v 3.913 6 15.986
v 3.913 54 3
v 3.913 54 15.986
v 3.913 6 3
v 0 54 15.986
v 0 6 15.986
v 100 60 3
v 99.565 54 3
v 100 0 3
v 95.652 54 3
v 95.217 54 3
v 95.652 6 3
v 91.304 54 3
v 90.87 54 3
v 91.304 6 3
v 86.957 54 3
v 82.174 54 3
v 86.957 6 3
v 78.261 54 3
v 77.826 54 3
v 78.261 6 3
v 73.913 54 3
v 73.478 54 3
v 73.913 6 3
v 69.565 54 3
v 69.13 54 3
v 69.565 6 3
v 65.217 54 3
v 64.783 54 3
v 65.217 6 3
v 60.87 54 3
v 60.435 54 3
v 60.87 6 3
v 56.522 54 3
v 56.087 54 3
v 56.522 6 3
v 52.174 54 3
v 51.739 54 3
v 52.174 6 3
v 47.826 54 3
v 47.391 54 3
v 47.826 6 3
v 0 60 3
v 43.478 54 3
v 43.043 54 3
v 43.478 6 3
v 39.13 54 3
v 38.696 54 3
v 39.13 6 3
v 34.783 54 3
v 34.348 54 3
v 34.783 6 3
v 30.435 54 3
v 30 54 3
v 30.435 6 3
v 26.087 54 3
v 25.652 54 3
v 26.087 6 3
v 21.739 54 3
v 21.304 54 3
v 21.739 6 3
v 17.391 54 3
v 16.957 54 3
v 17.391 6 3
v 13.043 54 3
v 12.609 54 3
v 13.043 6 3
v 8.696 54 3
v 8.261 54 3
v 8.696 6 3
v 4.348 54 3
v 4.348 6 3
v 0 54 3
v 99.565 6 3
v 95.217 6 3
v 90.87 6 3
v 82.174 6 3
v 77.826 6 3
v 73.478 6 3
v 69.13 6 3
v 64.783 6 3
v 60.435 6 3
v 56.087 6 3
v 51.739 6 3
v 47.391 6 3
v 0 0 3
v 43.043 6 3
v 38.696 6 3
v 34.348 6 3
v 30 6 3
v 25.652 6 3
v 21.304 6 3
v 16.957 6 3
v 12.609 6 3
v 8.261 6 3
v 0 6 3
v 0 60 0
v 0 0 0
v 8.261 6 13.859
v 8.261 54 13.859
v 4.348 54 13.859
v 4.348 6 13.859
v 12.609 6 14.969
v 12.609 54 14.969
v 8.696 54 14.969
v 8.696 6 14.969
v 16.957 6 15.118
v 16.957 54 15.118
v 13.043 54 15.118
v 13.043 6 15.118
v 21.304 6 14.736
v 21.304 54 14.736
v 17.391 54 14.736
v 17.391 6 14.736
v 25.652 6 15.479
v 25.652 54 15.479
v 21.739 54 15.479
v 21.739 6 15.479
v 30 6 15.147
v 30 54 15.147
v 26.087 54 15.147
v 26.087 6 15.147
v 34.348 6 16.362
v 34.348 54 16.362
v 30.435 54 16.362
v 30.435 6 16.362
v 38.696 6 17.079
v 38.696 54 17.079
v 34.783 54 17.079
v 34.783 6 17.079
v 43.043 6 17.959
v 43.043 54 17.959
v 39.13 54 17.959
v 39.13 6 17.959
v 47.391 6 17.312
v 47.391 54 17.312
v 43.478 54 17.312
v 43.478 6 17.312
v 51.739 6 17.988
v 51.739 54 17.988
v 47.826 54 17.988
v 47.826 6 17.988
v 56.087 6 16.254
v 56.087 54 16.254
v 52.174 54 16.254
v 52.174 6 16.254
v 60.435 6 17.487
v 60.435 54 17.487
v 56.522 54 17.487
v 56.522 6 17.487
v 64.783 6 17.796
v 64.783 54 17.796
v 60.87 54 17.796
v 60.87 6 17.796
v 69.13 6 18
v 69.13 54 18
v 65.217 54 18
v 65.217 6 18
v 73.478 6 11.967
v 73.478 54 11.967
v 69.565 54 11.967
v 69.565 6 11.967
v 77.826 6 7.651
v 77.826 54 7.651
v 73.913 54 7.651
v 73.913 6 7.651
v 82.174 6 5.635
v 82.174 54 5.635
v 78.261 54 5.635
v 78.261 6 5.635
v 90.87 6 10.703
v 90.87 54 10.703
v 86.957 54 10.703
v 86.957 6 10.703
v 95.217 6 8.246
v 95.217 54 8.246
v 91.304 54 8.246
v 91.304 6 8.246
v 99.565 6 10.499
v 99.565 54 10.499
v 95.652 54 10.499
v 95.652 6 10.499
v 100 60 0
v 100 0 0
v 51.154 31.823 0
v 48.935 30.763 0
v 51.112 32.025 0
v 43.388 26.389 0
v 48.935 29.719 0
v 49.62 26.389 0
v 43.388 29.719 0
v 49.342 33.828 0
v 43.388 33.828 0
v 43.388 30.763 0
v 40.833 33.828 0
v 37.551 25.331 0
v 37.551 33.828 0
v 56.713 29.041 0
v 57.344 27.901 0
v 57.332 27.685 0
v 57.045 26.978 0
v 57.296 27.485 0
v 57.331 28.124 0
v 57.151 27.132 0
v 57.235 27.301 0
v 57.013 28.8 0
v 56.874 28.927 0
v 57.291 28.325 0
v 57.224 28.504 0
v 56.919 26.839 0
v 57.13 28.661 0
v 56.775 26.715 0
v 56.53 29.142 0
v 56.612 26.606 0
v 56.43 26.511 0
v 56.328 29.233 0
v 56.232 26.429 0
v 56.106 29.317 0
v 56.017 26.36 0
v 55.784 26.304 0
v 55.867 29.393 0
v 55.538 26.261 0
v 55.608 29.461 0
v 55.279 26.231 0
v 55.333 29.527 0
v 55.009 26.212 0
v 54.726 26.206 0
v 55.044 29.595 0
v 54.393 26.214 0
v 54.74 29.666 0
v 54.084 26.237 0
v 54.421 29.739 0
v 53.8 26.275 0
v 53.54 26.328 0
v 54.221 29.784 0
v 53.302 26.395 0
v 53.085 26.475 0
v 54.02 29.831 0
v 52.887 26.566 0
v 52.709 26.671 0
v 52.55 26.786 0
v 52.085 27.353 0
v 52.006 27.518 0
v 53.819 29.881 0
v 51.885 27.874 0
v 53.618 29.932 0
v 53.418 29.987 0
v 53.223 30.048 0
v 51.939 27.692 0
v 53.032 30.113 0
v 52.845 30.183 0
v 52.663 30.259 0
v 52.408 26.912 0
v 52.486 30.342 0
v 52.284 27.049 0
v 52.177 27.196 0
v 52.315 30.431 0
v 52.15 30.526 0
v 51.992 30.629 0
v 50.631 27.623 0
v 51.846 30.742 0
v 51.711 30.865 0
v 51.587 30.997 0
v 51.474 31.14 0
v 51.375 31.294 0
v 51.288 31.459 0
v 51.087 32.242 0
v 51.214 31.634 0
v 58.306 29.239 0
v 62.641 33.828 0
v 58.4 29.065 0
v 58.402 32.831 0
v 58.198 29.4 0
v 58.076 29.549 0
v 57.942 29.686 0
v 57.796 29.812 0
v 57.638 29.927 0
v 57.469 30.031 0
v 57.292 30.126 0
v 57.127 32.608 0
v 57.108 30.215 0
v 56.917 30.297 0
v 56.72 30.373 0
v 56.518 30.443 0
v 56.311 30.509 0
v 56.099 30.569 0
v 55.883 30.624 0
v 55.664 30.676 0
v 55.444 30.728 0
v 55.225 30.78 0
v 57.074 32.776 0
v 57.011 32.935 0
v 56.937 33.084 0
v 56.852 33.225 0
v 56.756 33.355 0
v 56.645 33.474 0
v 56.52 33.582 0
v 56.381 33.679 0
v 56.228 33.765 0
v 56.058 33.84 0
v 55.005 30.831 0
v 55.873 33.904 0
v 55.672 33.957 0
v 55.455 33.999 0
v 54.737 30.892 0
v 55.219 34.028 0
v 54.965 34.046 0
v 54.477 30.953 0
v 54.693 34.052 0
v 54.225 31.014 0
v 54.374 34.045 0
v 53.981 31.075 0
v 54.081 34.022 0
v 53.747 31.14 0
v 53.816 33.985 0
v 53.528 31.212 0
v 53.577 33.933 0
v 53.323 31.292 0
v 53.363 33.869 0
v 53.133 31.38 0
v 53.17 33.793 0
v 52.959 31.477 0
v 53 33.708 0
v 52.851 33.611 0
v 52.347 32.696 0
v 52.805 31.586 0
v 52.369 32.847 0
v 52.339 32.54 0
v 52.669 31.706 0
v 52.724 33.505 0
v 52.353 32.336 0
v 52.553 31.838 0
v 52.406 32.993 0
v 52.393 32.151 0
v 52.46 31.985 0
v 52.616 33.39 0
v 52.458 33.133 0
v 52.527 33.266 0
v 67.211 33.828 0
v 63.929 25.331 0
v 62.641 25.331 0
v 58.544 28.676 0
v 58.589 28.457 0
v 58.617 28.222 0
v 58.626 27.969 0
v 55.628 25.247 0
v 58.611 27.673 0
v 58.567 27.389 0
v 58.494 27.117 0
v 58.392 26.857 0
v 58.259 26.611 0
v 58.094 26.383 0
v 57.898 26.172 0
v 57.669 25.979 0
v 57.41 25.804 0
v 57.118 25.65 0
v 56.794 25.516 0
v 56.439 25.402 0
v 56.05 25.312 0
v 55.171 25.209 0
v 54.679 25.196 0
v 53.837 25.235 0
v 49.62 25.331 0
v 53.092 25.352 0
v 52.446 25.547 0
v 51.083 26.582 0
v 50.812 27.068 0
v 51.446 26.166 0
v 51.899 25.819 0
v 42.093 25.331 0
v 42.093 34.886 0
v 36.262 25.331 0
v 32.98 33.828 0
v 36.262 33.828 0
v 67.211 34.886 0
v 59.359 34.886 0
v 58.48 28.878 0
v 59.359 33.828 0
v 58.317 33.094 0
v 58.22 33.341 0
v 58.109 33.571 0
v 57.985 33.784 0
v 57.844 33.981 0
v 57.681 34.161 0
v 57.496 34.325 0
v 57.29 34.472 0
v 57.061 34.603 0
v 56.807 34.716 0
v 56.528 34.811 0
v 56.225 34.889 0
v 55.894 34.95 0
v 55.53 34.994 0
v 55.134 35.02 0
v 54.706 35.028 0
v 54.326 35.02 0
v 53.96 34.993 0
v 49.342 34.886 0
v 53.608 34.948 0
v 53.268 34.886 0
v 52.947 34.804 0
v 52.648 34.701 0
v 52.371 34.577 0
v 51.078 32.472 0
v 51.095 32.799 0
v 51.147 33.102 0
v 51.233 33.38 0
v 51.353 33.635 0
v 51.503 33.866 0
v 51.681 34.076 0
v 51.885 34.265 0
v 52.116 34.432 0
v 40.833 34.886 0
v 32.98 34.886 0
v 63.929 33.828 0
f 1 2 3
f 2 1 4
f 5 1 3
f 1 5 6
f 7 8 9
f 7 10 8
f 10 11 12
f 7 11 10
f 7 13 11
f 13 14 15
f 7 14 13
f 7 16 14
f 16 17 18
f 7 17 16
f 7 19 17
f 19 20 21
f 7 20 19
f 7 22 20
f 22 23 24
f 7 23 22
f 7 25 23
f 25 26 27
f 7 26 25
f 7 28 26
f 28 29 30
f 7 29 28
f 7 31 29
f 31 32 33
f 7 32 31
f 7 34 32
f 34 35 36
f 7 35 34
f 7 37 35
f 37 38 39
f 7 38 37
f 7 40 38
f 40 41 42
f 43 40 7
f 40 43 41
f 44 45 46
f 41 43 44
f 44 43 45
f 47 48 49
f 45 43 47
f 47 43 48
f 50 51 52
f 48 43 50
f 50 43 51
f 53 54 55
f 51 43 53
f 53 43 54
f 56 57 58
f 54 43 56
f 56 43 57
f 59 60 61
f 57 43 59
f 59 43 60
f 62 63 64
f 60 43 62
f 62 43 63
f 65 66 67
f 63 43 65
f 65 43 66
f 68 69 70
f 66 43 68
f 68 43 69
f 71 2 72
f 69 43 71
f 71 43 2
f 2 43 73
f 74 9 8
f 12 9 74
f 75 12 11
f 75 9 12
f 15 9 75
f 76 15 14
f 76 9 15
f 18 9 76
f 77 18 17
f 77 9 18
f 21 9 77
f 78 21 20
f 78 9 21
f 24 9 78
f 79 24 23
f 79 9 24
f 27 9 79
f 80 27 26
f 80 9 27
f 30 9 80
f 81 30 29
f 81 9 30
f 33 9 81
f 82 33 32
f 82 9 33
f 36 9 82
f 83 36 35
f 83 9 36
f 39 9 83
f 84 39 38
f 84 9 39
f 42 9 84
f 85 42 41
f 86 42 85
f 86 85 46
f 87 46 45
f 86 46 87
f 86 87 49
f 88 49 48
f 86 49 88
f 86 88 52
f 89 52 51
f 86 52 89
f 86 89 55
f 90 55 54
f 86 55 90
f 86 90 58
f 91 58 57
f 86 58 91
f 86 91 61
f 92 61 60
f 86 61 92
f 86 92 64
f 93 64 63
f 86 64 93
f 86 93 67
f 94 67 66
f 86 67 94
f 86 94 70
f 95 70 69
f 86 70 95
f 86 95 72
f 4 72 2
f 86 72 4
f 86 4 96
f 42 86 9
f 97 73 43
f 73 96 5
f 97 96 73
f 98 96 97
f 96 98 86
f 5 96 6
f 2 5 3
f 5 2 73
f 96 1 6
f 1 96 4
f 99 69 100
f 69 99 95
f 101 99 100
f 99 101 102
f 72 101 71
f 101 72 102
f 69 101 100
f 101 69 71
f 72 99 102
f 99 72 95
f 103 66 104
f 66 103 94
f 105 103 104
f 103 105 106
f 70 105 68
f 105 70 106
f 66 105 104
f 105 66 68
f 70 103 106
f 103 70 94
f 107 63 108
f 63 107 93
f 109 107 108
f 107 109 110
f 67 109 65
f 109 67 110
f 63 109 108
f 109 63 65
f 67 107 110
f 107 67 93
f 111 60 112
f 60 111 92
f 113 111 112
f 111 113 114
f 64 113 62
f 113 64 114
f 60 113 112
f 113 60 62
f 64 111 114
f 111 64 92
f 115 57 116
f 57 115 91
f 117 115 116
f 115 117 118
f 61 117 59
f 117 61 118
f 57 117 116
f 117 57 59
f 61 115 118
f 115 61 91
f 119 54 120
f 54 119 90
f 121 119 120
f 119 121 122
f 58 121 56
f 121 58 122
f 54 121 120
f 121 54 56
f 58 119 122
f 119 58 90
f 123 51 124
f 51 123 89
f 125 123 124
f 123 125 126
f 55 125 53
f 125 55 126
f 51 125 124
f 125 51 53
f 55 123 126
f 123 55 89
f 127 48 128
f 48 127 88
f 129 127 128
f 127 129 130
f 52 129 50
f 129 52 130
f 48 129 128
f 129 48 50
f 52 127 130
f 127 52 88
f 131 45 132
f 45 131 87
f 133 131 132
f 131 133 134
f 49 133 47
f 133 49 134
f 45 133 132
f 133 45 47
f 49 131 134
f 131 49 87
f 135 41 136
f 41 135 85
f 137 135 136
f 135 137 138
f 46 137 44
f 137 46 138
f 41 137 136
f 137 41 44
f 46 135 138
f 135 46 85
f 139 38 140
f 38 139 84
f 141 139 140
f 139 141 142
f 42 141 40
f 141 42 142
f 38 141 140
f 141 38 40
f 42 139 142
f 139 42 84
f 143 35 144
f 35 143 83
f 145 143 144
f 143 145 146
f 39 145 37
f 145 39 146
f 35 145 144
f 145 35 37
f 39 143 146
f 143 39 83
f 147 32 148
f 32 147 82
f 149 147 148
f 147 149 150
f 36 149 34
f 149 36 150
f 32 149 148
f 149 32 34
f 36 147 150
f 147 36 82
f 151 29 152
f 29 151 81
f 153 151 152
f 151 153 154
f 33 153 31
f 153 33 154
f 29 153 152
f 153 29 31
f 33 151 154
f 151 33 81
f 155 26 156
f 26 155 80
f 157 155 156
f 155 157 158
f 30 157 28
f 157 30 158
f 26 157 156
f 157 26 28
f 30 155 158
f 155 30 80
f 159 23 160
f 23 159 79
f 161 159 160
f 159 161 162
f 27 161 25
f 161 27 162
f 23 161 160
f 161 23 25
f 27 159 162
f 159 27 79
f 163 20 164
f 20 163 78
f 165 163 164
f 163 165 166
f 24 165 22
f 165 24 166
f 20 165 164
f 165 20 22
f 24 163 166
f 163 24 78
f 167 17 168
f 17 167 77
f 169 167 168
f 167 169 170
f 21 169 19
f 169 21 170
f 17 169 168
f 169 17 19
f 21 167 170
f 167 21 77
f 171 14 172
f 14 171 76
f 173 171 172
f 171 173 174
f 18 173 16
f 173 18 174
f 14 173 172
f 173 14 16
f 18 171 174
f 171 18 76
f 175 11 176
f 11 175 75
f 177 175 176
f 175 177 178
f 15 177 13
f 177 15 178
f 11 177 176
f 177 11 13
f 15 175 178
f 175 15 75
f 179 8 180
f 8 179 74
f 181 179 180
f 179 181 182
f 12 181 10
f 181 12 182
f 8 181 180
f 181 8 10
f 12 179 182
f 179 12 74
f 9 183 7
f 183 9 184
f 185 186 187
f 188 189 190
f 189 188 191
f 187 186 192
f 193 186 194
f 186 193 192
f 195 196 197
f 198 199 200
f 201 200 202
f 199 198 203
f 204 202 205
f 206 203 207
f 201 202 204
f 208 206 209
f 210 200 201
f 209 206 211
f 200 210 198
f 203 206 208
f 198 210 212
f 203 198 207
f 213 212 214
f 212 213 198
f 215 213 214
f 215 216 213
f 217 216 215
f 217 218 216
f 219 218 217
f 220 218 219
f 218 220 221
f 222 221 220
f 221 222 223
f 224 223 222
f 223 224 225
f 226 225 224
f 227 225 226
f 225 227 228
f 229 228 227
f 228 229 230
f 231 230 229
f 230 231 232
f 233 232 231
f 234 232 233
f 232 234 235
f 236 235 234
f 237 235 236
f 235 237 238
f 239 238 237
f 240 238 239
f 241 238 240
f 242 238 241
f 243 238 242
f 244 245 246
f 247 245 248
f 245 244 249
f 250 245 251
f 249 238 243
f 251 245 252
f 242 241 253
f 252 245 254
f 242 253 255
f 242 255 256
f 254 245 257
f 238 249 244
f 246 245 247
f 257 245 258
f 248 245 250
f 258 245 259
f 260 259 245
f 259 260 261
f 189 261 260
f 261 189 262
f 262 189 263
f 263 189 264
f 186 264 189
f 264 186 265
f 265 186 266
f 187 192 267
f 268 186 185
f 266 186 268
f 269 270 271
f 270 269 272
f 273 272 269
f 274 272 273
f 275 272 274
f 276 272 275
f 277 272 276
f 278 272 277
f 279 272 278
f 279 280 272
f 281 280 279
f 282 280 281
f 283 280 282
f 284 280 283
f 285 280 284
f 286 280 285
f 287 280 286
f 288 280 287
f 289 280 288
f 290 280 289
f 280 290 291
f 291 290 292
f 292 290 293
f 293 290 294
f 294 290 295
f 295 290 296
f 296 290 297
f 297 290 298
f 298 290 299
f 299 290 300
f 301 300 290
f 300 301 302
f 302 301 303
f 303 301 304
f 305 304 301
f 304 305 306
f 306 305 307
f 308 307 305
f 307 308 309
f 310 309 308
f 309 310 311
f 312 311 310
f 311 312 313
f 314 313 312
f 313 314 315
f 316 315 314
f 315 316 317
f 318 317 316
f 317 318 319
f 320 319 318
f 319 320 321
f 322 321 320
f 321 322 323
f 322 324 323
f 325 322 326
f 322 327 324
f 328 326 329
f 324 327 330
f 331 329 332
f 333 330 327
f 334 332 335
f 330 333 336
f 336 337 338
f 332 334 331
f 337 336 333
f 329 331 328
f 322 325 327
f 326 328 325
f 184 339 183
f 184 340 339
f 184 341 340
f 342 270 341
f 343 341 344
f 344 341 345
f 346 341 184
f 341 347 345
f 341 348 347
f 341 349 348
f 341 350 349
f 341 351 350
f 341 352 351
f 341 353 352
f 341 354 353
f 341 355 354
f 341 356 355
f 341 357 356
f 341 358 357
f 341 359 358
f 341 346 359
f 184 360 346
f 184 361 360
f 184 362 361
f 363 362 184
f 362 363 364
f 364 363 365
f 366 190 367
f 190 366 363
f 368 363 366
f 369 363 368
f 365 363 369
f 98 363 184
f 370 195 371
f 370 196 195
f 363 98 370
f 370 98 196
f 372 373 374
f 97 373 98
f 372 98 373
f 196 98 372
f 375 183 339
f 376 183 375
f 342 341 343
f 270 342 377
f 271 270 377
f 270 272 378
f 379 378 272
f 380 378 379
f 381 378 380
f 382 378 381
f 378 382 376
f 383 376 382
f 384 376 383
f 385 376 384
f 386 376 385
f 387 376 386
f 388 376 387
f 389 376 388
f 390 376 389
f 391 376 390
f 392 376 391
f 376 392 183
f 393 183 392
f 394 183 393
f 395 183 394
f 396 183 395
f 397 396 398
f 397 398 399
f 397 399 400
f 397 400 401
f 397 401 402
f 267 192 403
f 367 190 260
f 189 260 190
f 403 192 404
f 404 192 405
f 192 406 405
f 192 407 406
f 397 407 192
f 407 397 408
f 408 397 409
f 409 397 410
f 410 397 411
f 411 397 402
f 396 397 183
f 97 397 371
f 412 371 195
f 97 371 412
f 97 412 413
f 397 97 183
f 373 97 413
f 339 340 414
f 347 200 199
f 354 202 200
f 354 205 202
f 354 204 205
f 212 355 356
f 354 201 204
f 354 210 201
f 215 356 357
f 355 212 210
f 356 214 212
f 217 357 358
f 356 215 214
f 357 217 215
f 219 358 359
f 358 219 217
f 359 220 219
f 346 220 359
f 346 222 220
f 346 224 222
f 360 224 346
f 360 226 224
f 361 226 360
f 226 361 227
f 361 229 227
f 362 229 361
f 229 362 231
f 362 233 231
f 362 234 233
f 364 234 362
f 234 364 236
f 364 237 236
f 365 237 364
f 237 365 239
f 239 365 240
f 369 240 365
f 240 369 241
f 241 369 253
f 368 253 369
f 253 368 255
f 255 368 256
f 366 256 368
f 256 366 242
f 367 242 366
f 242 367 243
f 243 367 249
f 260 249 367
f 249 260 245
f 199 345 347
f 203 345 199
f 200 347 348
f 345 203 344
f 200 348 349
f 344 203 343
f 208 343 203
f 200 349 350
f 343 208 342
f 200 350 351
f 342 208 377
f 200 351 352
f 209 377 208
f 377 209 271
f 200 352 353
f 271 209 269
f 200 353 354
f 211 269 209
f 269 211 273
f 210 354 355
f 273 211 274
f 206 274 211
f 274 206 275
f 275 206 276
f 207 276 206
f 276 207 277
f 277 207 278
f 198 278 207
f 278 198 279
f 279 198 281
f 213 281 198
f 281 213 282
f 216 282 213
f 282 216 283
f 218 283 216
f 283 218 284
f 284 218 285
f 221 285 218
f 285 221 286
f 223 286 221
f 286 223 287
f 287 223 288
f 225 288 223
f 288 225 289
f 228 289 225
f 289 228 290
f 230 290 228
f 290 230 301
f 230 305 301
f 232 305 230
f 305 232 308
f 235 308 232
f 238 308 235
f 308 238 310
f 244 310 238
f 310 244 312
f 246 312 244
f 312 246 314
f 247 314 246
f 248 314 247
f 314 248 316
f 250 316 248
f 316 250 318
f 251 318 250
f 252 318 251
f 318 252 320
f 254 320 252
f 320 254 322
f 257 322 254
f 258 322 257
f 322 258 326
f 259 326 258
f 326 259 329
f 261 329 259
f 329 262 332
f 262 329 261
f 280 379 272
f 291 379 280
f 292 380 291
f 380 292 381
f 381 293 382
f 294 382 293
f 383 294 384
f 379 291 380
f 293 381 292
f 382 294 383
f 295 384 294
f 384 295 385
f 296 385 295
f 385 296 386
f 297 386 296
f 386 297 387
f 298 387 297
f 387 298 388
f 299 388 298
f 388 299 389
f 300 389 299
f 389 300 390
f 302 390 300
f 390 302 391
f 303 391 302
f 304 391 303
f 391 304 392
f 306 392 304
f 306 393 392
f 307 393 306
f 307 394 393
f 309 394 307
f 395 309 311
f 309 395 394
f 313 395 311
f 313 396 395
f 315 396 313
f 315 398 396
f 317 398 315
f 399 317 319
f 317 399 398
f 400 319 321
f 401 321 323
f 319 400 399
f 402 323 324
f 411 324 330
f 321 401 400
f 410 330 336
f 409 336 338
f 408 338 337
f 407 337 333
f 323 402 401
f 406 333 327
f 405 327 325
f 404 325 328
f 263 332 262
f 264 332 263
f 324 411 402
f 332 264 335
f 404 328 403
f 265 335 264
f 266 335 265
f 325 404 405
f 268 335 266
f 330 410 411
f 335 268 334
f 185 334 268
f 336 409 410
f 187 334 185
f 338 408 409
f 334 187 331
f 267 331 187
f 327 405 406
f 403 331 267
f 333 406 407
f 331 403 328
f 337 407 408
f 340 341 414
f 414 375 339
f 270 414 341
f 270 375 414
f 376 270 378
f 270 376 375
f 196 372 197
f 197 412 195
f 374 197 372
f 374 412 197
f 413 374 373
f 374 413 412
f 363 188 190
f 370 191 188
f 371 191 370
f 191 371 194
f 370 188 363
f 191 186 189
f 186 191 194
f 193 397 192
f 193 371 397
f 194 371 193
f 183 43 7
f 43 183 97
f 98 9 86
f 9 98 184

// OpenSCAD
// Generated by SolidPython 1.1.3 on 2025-04-12 11:14:56


difference() {
	union() {
		cube(center = false, size = [100, 60, 3]);
		union() {
			translate(v = [0.0000000000, 6.0000000000, 3]) {
				cube(size = [3.9130434783, 48.0000000000, 12.986204537140186]);
			}
			translate(v = [4.3478260870, 6.0000000000, 3]) {
				cube(size = [3.9130434783, 48.0000000000, 10.858750813041151]);
			}
			translate(v = [8.6956521739, 6.0000000000, 3]) {
				cube(size = [3.9130434783, 48.0000000000, 11.969110069021792]);
			}
			translate(v = [13.0434782609, 6.0000000000, 3]) {
				cube(size = [3.9130434783, 48.0000000000, 12.117738734673768]);
			}
			translate(v = [17.3913043478, 6.0000000000, 3]) {
				cube(size = [3.9130434783, 48.0000000000, 11.73596366350858]);
			}
			translate(v = [21.7391304348, 6.0000000000, 3]) {
				cube(size = [3.9130434783, 48.0000000000, 12.479115885564132]);
			}
			translate(v = [26.0869565217, 6.0000000000, 3]) {
				cube(size = [3.9130434783, 48.0000000000, 12.146883702949589]);
			}
			translate(v = [30.4347826087, 6.0000000000, 3]) {
				cube(size = [3.9130434783, 48.0000000000, 13.36215417216846]);
			}
			translate(v = [34.7826086957, 6.0000000000, 3]) {
				cube(size = [3.9130434783, 48.0000000000, 14.079074144016632]);
			}
			translate(v = [39.1304347826, 6.0000000000, 3]) {
				cube(size = [3.9130434783, 48.0000000000, 14.959199712552525]);
			}
			translate(v = [43.4782608696, 6.0000000000, 3]) {
				cube(size = [3.9130434783, 48.0000000000, 14.312220549529846]);
			}
			translate(v = [47.8260869565, 6.0000000000, 3]) {
				cube(size = [3.9130434783, 48.0000000000, 14.988344680828348]);
			}
			translate(v = [52.1739130435, 6.0000000000, 3]) {
				cube(size = [3.9130434783, 48.0000000000, 13.254321347066153]);
			}
			translate(v = [56.5217391304, 6.0000000000, 3]) {
				cube(size = [3.9130434783, 48.0000000000, 14.4870814653892]);
			}
			translate(v = [60.8695652174, 6.0000000000, 3]) {
				cube(size = [3.9130434783, 48.0000000000, 14.795998562762627]);
			}
			translate(v = [65.2173913043, 6.0000000000, 3]) {
				cube(size = [3.9130434783, 48.0000000000, 15.0]);
			}
			translate(v = [69.5652173913, 6.0000000000, 3]) {
				cube(size = [3.9130434783, 48.0000000000, 8.967360659421583]);
			}
			translate(v = [73.9130434783, 6.0000000000, 3]) {
				cube(size = [3.9130434783, 48.0000000000, 4.65125500350119]);
			}
			translate(v = [78.2608695652, 6.0000000000, 3]) {
				cube(size = [3.9130434783, 48.0000000000, 2.634546822572928]);
			}
			translate(v = [82.6086956522, 6.0000000000, 3]) {
				cube(size = [3.9130434783, 48.0000000000, 0.0]);
			}
			translate(v = [86.9565217391, 6.0000000000, 3]) {
				cube(size = [3.9130434783, 48.0000000000, 7.702547301652045]);
			}
			translate(v = [91.3043478261, 6.0000000000, 3]) {
				cube(size = [3.9130434783, 48.0000000000, 5.245774113006939]);
			}
			translate(v = [95.6521739130, 6.0000000000, 3]) {
				cube(size = [3.9130434783, 48.0000000000, 7.498541417516872]);
			}
		}
	}
	translate(v = [50.0000000000, 30.0000000000, -2]) {
		linear_extrude(height = 2) {
			text(halign = "center", size = 10, text = "TEST", valign = "center");
		}
	}
}
/***********************************************
*********      SolidPython code:      **********
************************************************
 
#!/usr/bin/env python3
"""
Improved 3D Model Generation Module for Crazy Stock Badges Project

This module provides classes and functions for generating 3D models from stock data
using SolidPython to create OpenSCAD files that can be rendered to STL for 3D printing.
"""

import os
import numpy as np
import pandas as pd
from solid import *
from solid.utils import *
import logging
from abc import ABC, abstractmethod
from pathlib import Path
import math

# Configure logging
logging.basicConfig(
    level=logging.INFO,
    format='%(asctime)s - %(name)s - %(levelname)s - %(message)s'
)
logger = logging.getLogger('improved_3d_models')


class StockDataValidator:
    """Validates and preprocesses stock data for 3D model generation."""
    
    @staticmethod
    def validate_data(data):
        """
        Validate that the data contains the required columns.
        
        Args:
            data (pandas.DataFrame): Stock data
            
        Returns:
            bool: True if data is valid, False otherwise
        """
        required_columns = ['Close', 'Volume']
        
        if not isinstance(data, pd.DataFrame):
            logger.error("Data must be a pandas DataFrame")
            return False
        
        for col in required_columns:
            if col not in data.columns:
                logger.error(f"Required column '{col}' not found in data")
                return False
        
        if len(data) < 5:
            logger.error("Data must contain at least 5 rows")
            return False
            
        return True
    
    @staticmethod
    def normalize_data(data, columns=None, new_min=0, new_max=10):
        """
        Normalize specified columns to a new range.
        
        Args:
            data (pandas.DataFrame): Stock data
            columns (list): List of columns to normalize
            new_min (float): Minimum value for normalized data
            new_max (float): Maximum value for normalized data
            
        Returns:
            pandas.DataFrame: Data with normalized columns added
        """
        if columns is None:
            columns = ['Close', 'Volume']
        
        result = data.copy()
        
        for col in columns:
            if col in data.columns:
                norm_col = f'{col}_Normalized'
                min_val = data[col].min()
                max_val = data[col].max()
                
                # Avoid division by zero
                if max_val == min_val:
                    result[norm_col] = new_min
                else:
                    result[norm_col] = (data[col] - min_val) / (max_val - min_val) * (new_max - new_min) + new_min
            else:
                logger.warning(f"Column '{col}' not found in data, skipping normalization")
        
        return result


class Badge3DModel(ABC):
    """Abstract base class for 3D badge models."""
    
    def __init__(self, stock_data, ticker_symbol, params=None):
        """
        Initialize the 3D model.
        
        Args:
            stock_data (pandas.DataFrame): Stock data
            ticker_symbol (str): Stock ticker symbol
            params (dict): Additional parameters for the model
        """
        self.ticker_symbol = ticker_symbol
        self.params = params or {}
        
        # Validate and normalize data
        validator = StockDataValidator()
        if not validator.validate_data(stock_data):
            raise ValueError("Invalid stock data")
        
        # Set default normalization ranges
        height_range = self.params.get('height_range', (0, 15))
        width_range = self.params.get('width_range', (0, 10))
        
        # Normalize data
        self.data = validator.normalize_data(
            stock_data, 
            columns=['Close', 'Volume', 'High', 'Low'],
            new_min=height_range[0],
            new_max=height_range[1]
        )
        
        # Normalize volume separately for width
        self.data['Volume_Width'] = validator.normalize_data(
            stock_data, 
            columns=['Volume'],
            new_min=width_range[0],
            new_max=width_range[1]
        )['Volume_Normalized']
        
        # Initialize model components
        self.base_model = None
        self.feature_model = None
        self.text_model = None
        self.final_model = None
        
        # Model statistics
        self.stats = {
            'num_objects': 0,
            'height_diff': 0,
            'width_diff': 0,
            'depth_diff': 0,
            'size': (0, 0, 0)
        }
    
    @abstractmethod
    def generate_base(self):
        """Generate the base part of the model."""
        pass
    
    @abstractmethod
    def generate_feature(self):
        """Generate the feature part of the model based on stock data."""
        pass
    
    @abstractmethod
    def generate_text(self):
        """Generate text elements for the model."""
        pass
    
    def combine_models(self):
        """
        Combine base, feature, and text models into the final model.
        
        Returns:
            solid.OpenSCADObject: Combined 3D model
        """
        if self.base_model is None:
            self.generate_base()
        
        if self.feature_model is None:
            self.generate_feature()
        
        if self.text_model is None:
            self.generate_text()
        
        # Combine models
        combined = union()(
            self.base_model,
            self.feature_model
        )
        
        # Apply text as a difference (engraving)
        if self.text_model is not None:
            self.final_model = difference()(
                combined,
                self.text_model
            )
        else:
            self.final_model = combined
        
        return self.final_model
    
    def calculate_stats(self):
        """
        Calculate statistics about the model.
        
        Returns:
            dict: Model statistics
        """
        # This is a placeholder - in a real implementation, we would
        # analyze the OpenSCAD model to extract these statistics
        self.stats['num_objects'] = len(self.data)
        self.stats['height_diff'] = self.params.get('height_range', (0, 15))[1]
        self.stats['width_diff'] = self.params.get('width_range', (0, 10))[1]
        self.stats['depth_diff'] = 5  # Example value
        self.stats['size'] = (100, 100, 20)  # Example values
        
        return self.stats
    
    def save_to_file(self, filename=None):
        """
        Save the model to an OpenSCAD file.
        
        Args:
            filename (str): Output filename
            
        Returns:
            str: Path to the saved file
        """
        if self.final_model is None:
            self.combine_models()
        
        if filename is None:
            filename = f"{self.ticker_symbol}_badge.scad"
        
        # Save the model
        scad_render_to_file(self.final_model, filename)
        logger.info(f"Model saved to {filename}")
        
        return filename


class DiscBadge(Badge3DModel):
    """Circular badge with stock data features."""
    
    def generate_base(self):
        """
        Generate a circular base for the badge.
        
        Returns:
            solid.OpenSCADObject: Base 3D model
        """
        radius = self.params.get('base_radius', 50)
        height = self.params.get('base_height', 3)
        
        self.base_model = cylinder(r=radius, h=height, center=False)
        return self.base_model
    
    def generate_feature(self):
        """
        Generate features on the badge based on stock data.
        
        Returns:
            solid.OpenSCADObject: Feature 3D model
        """
        feature_type = self.params.get('feature_type', 'jagged_edge')
        
        if feature_type == 'jagged_edge':
            self.feature_model = self._generate_jagged_edge()
        elif feature_type == 'spiral':
            self.feature_model = self._generate_spiral()
        else:
            logger.warning(f"Unknown feature type: {feature_type}, using jagged_edge")
            self.feature_model = self._generate_jagged_edge()
        
        return self.feature_model
    
    def _generate_jagged_edge(self):
        """
        Generate a jagged edge disc based on stock prices.
        
        Returns:
            solid.OpenSCADObject: Jagged edge 3D model
        """
        base_radius = self.params.get('base_radius', 50)
        height = self.params.get('feature_height', 2)
        z_offset = self.params.get('base_height', 3)
        
        # Parameters for the polygon
        num_points = len(self.data)  # Use all data points
        angles = np.linspace(0, 2 * np.pi, num_points)  # Angles around the circle
        
        # Map normalized stock prices to the polygon edge
        radii = self.data['Close_Normalized'] + base_radius
        
        # Create points for the polygon
        points = []
        for i in range(num_points):
            x = radii.iloc[i] * np.cos(angles[i])  # X coordinate
            y = radii.iloc[i] * np.sin(angles[i])  # Y coordinate
            points.append([x, y])
        
        # Create 2D polygon and extrude to 3D
        jagged_disc_2d = polygon(points)
        jagged_disc_3d = linear_extrude(height=height)(jagged_disc_2d)
        
        # Translate to sit on top of the base
        return translate([0, 0, z_offset])(jagged_disc_3d)
    
    def _generate_spiral(self):
        """
        Generate a spiral landscape based on stock data.
        
        Returns:
            solid.OpenSCADObject: Spiral landscape 3D model
        """
        radius = self.params.get('spiral_radius', 45)
        z_offset = self.params.get('base_height', 3)
        spiral_turns = self.params.get('spiral_turns', 7)
        
        # Generate points on a spiral
        num_points = len(self.data)
        angles = np.linspace(0, spiral_turns * 2 * np.pi, num_points)  # Spiral angles
        radii = np.linspace(0, radius, num_points)  # Gradually increase radius for spiral
        
        # Map normalized stock prices to heights and widths
        heights = self.data['Close_Normalized']
        widths = self.data['Volume_Width']
        
        # Calculate coordinates
        x = radii * np.cos(angles)  # X coordinates
        y = radii * np.sin(angles)  # Y coordinates
        
        # Create the landscape as a series of stacked cylinders
        landscape = []
        for i in range(num_points):
            cylinder_height = heights.iloc[i]
            cylinder_radius = widths.iloc[i]
            
            landscape.append(
                translate([x[i], y[i], z_offset])(
                    cylinder(r=cylinder_radius, h=cylinder_height, center=False)
                )
            )
        
        # Combine the landscape into a single object
        return union()(landscape)
    
    def generate_text(self):
        """
        Generate text for the badge.
        
        Returns:
            solid.OpenSCADObject: Text 3D model
        """
        text_depth = self.params.get('text_depth', 2)
        text_size = self.params.get('text_size', 10)
        text_content = self.params.get('text_content', self.ticker_symbol)
        text_position = self.params.get('text_position', 'bottom')
        
        # Create text object
        if len(text_content) > 10:
            # For longer text, use multiline
            self.text_model = self._generate_multiline_text(
                text_content, text_size, text_depth
            )
        else:
            # For shorter text, use single line
            text_2d = text(text_content, size=text_size, halign='center', valign='center')
            self.text_model = linear_extrude(height=text_depth)(text_2d)
        
        # Position the text
        if text_position == 'bottom':
            # Position text on the bottom of the badge (as an engraving)
            z_pos = -text_depth
            self.text_model = translate([0, 0, z_pos])(self.text_model)
        elif text_position == 'top':
            # Position text on the top of the badge
            base_height = self.params.get('base_height', 3)
            feature_height = self.params.get('feature_height', 2)
            z_pos = base_height + feature_height
            self.text_model = translate([0, 0, z_pos])(self.text_model)
        
        return self.text_model
    
    def _generate_multiline_text(self, text_content, size, depth, wrap_chars=10):
        """
        Generate multiline text object.
        
        Args:
            text_content (str): Text to display
            size (float): Text size
            depth (float): Text depth
            wrap_chars (int): Number of characters per line
            
        Returns:
            solid.OpenSCADObject: Multiline text 3D model
        """
        # Split text into lines
        lines = [text_content[i:i+wrap_chars] for i in range(0, len(text_content), wrap_chars)]
        num_lines = len(lines)
        
        # Generate 3D text objects for each line and center them
        text_objects = []
        line_spacing = size * 1.2  # Adjust spacing based on text size
        
        for i, line in enumerate(lines):
            y_offset = (num_lines - 1) / 2 - i  # Center the text block
            text_2d = text(line, size=size, halign='center', valign='center')
            text_3d = linear_extrude(height=depth)(text_2d)
            text_objects.append(translate([0, y_offset * line_spacing, 0])(text_3d))
        
        return union()(text_objects)


class RectangularBadge(Badge3DModel):
    """Rectangular badge with stock data features."""
    
    def generate_base(self):
        """
        Generate a rectangular base for the badge.
        
        Returns:
            solid.OpenSCADObject: Base 3D model
        """
        width = self.params.get('base_width', 100)
        depth = self.params.get('base_depth', 60)
        height = self.params.get('base_height', 3)
        
        self.base_model = cube([width, depth, height], center=False)
        return self.base_model
    
    def generate_feature(self):
        """
        Generate features on the badge based on stock data.
        
        Returns:
            solid.OpenSCADObject: Feature 3D model
        """
        feature_type = self.params.get('feature_type', 'bar_chart')
        
        if feature_type == 'bar_chart':
            self.feature_model = self._generate_bar_chart()
        elif feature_type == 'surface_plot':
            self.feature_model = self._generate_surface_plot()
        else:
            logger.warning(f"Unknown feature type: {feature_type}, using bar_chart")
            self.feature_model = self._generate_bar_chart()
        
        return self.feature_model
    
    def _generate_bar_chart(self):
        """
        Generate a bar chart based on stock prices.
        
        Returns:
            solid.OpenSCADObject: Bar chart 3D model
        """
        base_width = self.params.get('base_width', 100)
        base_depth = self.params.get('base_depth', 60)
        z_offset = self.params.get('base_height', 3)
        bar_width = base_width / len(self.data)
        
        # Create bars for each data point
        bars = []
        for i in range(len(self.data)):
            bar_height = self.data['Close_Normalized'].iloc[i]
            bar_depth = base_depth * 0.8  # Make bars slightly narrower than the base
            
            # Position each bar along the x-axis
            x_pos = i * bar_width
            y_pos = (base_depth - bar_depth) / 2  # Center bars on the y-axis
            
            bars.append(
                translate([x_pos, y_pos, z_offset])(
                    cube([bar_width * 0.9, bar_depth, bar_height])
                )
            )
        
        return union()(bars)
    
    def _generate_surface_plot(self):
        """
        Generate a surface plot based on stock data.
        
        Returns:
            solid.OpenSCADObject: Surface plot 3D model
        """
        base_width = self.params.get('base_width', 100)
        base_depth = self.params.get('base_depth', 60)
        z_offset = self.params.get('base_height', 3)
        
        # Create a grid of points
        grid_size = int(math.sqrt(len(self.data)))
        if grid_size < 2:
            grid_size = 2
        
        # Truncate data to fit grid
        data_points = min(grid_size * grid_size, len(self.data))
        heights = self.data['Close_Normalized'].iloc[:data_points].values
        
        # Reshape to grid
        try:
            height_grid = heights[:grid_size * grid_size].reshape(grid_size, grid_size)
        except ValueError:
            # If reshaping fails, pad with zeros
            padded = np.zeros(grid_size * grid_size)
            padded[:len(heights)] = heights
            height_grid = padded.reshape(grid_size, grid_size)
        
        # Calculate cell dimensions
        cell_width = base_width / grid_size
        cell_depth = base_depth / grid_size
        
        # Create cells for the surface
        cells = []
        for i in range(grid_size):
            for j in range(grid_size):
                cell_height = height_grid[i, j]
                
                x_pos = i * cell_width
                y_pos = j * cell_depth
                
                cells.append(
                    translate([x_pos, y_pos, z_offset])(
                        cube([cell_width * 0.95, cell_depth * 0.95, cell_height])
                    )
                )
        
        return union()(cells)
    
    def generate_text(self):
        """
        Generate text for the badge.
        
        Returns:
            solid.OpenSCADObject: Text 3D model
        """
        text_depth = self.params.get('text_depth', 2)
        text_size = self.params.get('text_size', 10)
        text_content = self.params.get('text_content', self.ticker_symbol)
        text_position = self.params.get('text_position', 'bottom')
        
        base_width = self.params.get('base_width', 100)
        base_depth = self.params.get('base_depth', 60)
        
        # Create text object
        text_2d = text(text_content, size=text_size, halign='center', valign='center')
        self.text_model = linear_extrude(height=text_depth)(text_2d)
        
        # Position the text
        x_pos = base_width / 2  # Center on x-axis
        y_pos = base_depth / 2  # Center on y-axis
        
        if text_position == 'bottom':
            # Position text on the bottom of the badge (as an engraving)
            z_pos = -text_depth
            self.text_model = translate([x_pos, y_pos, z_pos])(self.text_model)
        elif text_position == 'top':
            # Position text on the top of the badge
            base_height = self.params.get('base_height', 3)
            feature_height = self.params.get('feature_height', 10)  # Approximate
            z_pos = base_height + feature_height
            self.text_model = translate([x_pos, y_pos, z_pos])(self.text_model)
        elif text_position == 'front':
            # Position text on the front of the badge
            z_pos = self.params.get('base_height', 3) / 2
            y_pos = 0  # Front edge
            self.text_model = translate([x_pos, y_pos, z_pos])(
                rotate([90, 0, 0])(self.text_model)
            )
        
        return self.text_model


class TriangularBadge(Badge3DModel):
    """Triangular badge with stock data features."""
    
    def generate_base(self):
        """
        Generate a triangular base for the badge.
        
        Returns:
            solid.OpenSCADObject: Base 3D model
        """
        side_length = self.params.get('side_length', 80)
        height = self.params.get('base_height', 3)
        
        # Create an equilateral triangle
        points = [
            [0, 0],
            [side_length, 0],
            [side_length / 2, side_length * math.sin(math.radians(60))]
        ]
        
        triangle_2d = polygon(points)
        self.base_model = linear_extrude(height=height)(triangle_2d)
        return self.base_model
    
    def generate_feature(self):
        """
        Generate features on the badge based on stock data.
        
        Returns:
            solid.OpenSCADObject: Feature 3D model
        """
        feature_type = self.params.get('feature_type', 'pyramid')
        
        if feature_type == 'pyramid':
            self.feature_model = self._generate_pyramid()
        elif feature_type == 'terrain':
            self.feature_model = self._generate_terrain()
        else:
            logger.warning(f"Unknown feature type: {feature_type}, using pyramid")
            self.feature_model = self._generate_pyramid()
        
        return self.feature_model
    
    def _generate_pyramid(self):
        """
        Generate a pyramid feature with height based on stock data.
        
        Returns:
            solid.OpenSCADObject: Pyramid 3D model
        """
        side_length = self.params.get('side_length', 80)
        z_offset = self.params.get('base_height', 3)
        
        # Use the average of normalized close prices for the pyramid height
        pyramid_height = self.data['Close_Normalized'].mean() * 3
        
        # Create a pyramid (triangular prism)
        points = [
            [0, 0],
            [side_length, 0],
            [side_length / 2, side_length * math.sin(math.radians(60))]
        ]
        
        # Create the pyramid by scaling a series of triangles
        layers = 20  # Number of layers in the pyramid
        pyramid_parts = []
        
        for i in range(layers):
            # Calculate the scale factor for this layer
            scale_factor = 1.0 - (i / layers)
            layer_height = pyramid_height * (i / layers)
            
            # Scale the points for this layer
            scaled_points = [[p[0] * scale_factor, p[1] * scale_factor] for p in points]
            
            # Create the layer
            layer_2d = polygon(scaled_points)
            layer_3d = linear_extrude(height=pyramid_height/layers)(layer_2d)
            
            # Position the layer
            pyramid_parts.append(
                translate([
                    side_length * (1 - scale_factor) / 2,  # Center on x
                    side_length * (1 - scale_factor) / 4,  # Center on y
                    z_offset + layer_height
                ])(layer_3d)
            )
        
        return union()(pyramid_parts)
    
    def _generate_terrain(self):
        """
        Generate a terrain feature based on stock data.
        
        Returns:
            solid.OpenSCADObject: Terrain 3D model
        """
        side_length = self.params.get('side_length', 80)
        z_offset = self.params.get('base_height', 3)
        
        # Create a triangular grid
        grid_size = 10  # Number of divisions along each side
        
        # Calculate the height of the triangle
        triangle_height = side_length * math.sin(math.radians(60))
        
        # Calculate cell dimensions
        cell_width = side_length / grid_size
        cell_height = triangle_height / grid_size
        
        # Create cells for the terrain
        cells = []
        
        # Use stock data to determine cell heights
        # We'll cycle through the data if we need more points than we have
        data_len = len(self.data)
        
        cell_count = 0
        for i in range(grid_size):
            # Calculate the number of cells in this row
            row_cells = grid_size - i
            
            for j in range(row_cells):
                # Get the data index, cycling if necessary
                data_idx = cell_count % data_len
                cell_count += 1
                
                # Get the height for this cell
                terrain_height = self.data['Close_Normalized'].iloc[data_idx]
                
                # Calculate position
                x_pos = j * cell_width + (i * cell_width / 2)  # Offset each row
                y_pos = i * cell_height
                
                cells.append(
                    translate([x_pos, y_pos, z_offset])(
                        cube([cell_width * 0.95, cell_height * 0.95, terrain_height])
                    )
                )
        
        return union()(cells)
    
    def generate_text(self):
        """
        Generate text for the badge.
        
        Returns:
            solid.OpenSCADObject: Text 3D model
        """
        text_depth = self.params.get('text_depth', 2)
        text_size = self.params.get('text_size', 8)
        text_content = self.params.get('text_content', self.ticker_symbol)
        text_position = self.params.get('text_position', 'bottom')
        
        side_length = self.params.get('side_length', 80)
        
        # Create text object
        text_2d = text(text_content, size=text_size, halign='center', valign='center')
        self.text_model = linear_extrude(height=text_depth)(text_2d)
        
        # Position the text
        x_pos = side_length / 2  # Center on x-axis
        y_pos = side_length * math.sin(math.radians(60)) / 3  # Lower third of triangle
        
        if text_position == 'bottom':
            # Position text on the bottom of the badge (as an engraving)
            z_pos = -text_depth
            self.text_model = translate([x_pos, y_pos, z_pos])(self.text_model)
        elif text_position == 'top':
            # Position text on the top of the badge
            base_height = self.params.get('base_height', 3)
            feature_height = self.params.get('feature_height', 10)  # Approximate
            z_pos = base_height + feature_height
            self.text_model = translate([x_pos, y_pos, z_pos])(self.text_model)
        
        return self.text_model


class BadgeFactory:
    """Factory class for creating different types of badges."""
    
    @staticmethod
    def create_badge(badge_type, stock_data, ticker_symbol, params=None):
        """
        Create a badge of the specified type.
        
        Args:
            badge_type (str): Type of badge to create
            stock_data (pandas.DataFrame): Stock data
            ticker_symbol (str): Stock ticker symbol
            params (dict): Additional parameters for the badge
            
        Returns:
            Badge3DModel: Badge model instance
        """
        if badge_type == 'disc':
            return DiscBadge(stock_data, ticker_symbol, params)
        elif badge_type == 'rectangular':
            return RectangularBadge(stock_data, ticker_symbol, params)
        elif badge_type == 'triangular':
            return TriangularBadge(stock_data, ticker_symbol, params)
        else:
            logger.warning(f"Unknown badge type: {badge_type}, using disc")
            return DiscBadge(stock_data, ticker_symbol, params)


def main():
    """
    Main function for testing the module.
    """
    import argparse
    
    parser = argparse.ArgumentParser(description='Generate 3D badge models from stock data')
    parser.add_argument('--ticker', type=str, default='TSLA', help='Stock ticker symbol')
    parser.add_argument('--data-file', type=str, default='./stock_data', help='Stock data CSV file')
    parser.add_argument('--badge-type', type=str, default='disc', 
                       choices=['disc', 'rectangular', 'triangular'], help='Badge type')
    parser.add_argument('--feature-type', type=str, help='Feature type (depends on badge type)')
    parser.add_argument('--output', type=str, help='Output file name')
    args = parser.parse_args()
    
    try:
        # Load stock data
        if os.path.exists(args.data_file):
            stock_data = pd.read_csv(args.data_file)
            logger.info(f"Loaded stock data from {args.data_file}")
        else:
            logger.error(f"Data file not found: {args.data_file}")
            return 1
        
        # Set parameters based on badge type
        params = {}
        if args.feature_type:
            params['feature_type'] = args.feature_type
        
        # Create the badge
        badge = BadgeFactory.create_badge(args.badge_type, stock_data, args.ticker, params)
        
        # Generate the model
        badge.generate_base()
        badge.generate_feature()
        badge.generate_text()
        badge.combine_models()
        
        # Calculate and print statistics
        stats = badge.calculate_stats()
        print("\nModel Statistics:")
        for key, value in stats.items():
            print(f"  {key}: {value}")
        
        # Save the model
        output_file = args.output or f"{args.ticker}_{args.badge_type}_badge.scad"
        badge.save_to_file(output_file)
        print(f"\nModel saved to: {output_file}")
        
    except Exception as e:
        logger.error(f"Error in main function: {e}")
        print(f"Error: {str(e)}")
        return 1
    
    return 0


if __name__ == "__main__":
    import sys
    sys.exit(main())
 
 
************************************************/
